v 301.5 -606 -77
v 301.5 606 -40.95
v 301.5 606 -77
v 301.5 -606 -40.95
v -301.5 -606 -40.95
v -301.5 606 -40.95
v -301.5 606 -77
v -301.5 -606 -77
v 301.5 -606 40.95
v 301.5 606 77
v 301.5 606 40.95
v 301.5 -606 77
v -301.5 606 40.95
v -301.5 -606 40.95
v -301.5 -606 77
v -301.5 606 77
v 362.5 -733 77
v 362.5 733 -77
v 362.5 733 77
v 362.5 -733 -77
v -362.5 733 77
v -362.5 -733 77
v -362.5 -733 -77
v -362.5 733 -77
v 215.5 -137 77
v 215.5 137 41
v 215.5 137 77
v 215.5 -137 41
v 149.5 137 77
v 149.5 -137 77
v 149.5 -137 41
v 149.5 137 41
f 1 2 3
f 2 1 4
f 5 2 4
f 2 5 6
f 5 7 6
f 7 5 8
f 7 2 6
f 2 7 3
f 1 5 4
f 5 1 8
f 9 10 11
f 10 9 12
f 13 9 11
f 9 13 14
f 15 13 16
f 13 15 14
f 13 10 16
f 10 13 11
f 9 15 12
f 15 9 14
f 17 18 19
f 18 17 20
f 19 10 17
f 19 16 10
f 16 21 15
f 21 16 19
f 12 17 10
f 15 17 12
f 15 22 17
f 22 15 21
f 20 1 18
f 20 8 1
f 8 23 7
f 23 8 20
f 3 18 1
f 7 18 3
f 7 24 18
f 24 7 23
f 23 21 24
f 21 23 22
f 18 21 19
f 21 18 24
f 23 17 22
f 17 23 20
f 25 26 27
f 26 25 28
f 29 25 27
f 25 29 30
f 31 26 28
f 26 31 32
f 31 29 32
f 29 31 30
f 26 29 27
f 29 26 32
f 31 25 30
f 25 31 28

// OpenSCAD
// Box dimensions
box_width = 725;
box_depth = 1466;
box_height = 154;

// Recess parameters
recess_depth = 36;
bezel_width_x = 61;
bezel_width_y = 127;

// Calculated recess dimensions
recess_width = box_width - (2 * bezel_width_x);
recess_depth_y = box_depth - (2 * bezel_width_y);

// Protruding box parameters
protrude_width = 66;
protrude_depth = 274;
protrude_height = 36;
protrude_x_offset = (recess_width/2) - 86 - (protrude_width/2); // 86 units from end of recess

union() {
    difference() {
        // Main box
        cube([box_width, box_depth, box_height], center=true);
        
        // Recess cutouts on top and bottom using a loop
        for (z_pos = [-(box_height - recess_depth) / 2, (box_height - recess_depth) / 2]) {
            translate([0, 0, z_pos]) {
                cube([recess_width, recess_depth_y, recess_depth + 0.1], center=true);
            }
        }
    }
    
    // Protruding box in the top recess area
    translate([protrude_x_offset, 0, (box_height - recess_depth) / 2]) {
        cube([protrude_width, protrude_depth, protrude_height], center=true);
    }
}
